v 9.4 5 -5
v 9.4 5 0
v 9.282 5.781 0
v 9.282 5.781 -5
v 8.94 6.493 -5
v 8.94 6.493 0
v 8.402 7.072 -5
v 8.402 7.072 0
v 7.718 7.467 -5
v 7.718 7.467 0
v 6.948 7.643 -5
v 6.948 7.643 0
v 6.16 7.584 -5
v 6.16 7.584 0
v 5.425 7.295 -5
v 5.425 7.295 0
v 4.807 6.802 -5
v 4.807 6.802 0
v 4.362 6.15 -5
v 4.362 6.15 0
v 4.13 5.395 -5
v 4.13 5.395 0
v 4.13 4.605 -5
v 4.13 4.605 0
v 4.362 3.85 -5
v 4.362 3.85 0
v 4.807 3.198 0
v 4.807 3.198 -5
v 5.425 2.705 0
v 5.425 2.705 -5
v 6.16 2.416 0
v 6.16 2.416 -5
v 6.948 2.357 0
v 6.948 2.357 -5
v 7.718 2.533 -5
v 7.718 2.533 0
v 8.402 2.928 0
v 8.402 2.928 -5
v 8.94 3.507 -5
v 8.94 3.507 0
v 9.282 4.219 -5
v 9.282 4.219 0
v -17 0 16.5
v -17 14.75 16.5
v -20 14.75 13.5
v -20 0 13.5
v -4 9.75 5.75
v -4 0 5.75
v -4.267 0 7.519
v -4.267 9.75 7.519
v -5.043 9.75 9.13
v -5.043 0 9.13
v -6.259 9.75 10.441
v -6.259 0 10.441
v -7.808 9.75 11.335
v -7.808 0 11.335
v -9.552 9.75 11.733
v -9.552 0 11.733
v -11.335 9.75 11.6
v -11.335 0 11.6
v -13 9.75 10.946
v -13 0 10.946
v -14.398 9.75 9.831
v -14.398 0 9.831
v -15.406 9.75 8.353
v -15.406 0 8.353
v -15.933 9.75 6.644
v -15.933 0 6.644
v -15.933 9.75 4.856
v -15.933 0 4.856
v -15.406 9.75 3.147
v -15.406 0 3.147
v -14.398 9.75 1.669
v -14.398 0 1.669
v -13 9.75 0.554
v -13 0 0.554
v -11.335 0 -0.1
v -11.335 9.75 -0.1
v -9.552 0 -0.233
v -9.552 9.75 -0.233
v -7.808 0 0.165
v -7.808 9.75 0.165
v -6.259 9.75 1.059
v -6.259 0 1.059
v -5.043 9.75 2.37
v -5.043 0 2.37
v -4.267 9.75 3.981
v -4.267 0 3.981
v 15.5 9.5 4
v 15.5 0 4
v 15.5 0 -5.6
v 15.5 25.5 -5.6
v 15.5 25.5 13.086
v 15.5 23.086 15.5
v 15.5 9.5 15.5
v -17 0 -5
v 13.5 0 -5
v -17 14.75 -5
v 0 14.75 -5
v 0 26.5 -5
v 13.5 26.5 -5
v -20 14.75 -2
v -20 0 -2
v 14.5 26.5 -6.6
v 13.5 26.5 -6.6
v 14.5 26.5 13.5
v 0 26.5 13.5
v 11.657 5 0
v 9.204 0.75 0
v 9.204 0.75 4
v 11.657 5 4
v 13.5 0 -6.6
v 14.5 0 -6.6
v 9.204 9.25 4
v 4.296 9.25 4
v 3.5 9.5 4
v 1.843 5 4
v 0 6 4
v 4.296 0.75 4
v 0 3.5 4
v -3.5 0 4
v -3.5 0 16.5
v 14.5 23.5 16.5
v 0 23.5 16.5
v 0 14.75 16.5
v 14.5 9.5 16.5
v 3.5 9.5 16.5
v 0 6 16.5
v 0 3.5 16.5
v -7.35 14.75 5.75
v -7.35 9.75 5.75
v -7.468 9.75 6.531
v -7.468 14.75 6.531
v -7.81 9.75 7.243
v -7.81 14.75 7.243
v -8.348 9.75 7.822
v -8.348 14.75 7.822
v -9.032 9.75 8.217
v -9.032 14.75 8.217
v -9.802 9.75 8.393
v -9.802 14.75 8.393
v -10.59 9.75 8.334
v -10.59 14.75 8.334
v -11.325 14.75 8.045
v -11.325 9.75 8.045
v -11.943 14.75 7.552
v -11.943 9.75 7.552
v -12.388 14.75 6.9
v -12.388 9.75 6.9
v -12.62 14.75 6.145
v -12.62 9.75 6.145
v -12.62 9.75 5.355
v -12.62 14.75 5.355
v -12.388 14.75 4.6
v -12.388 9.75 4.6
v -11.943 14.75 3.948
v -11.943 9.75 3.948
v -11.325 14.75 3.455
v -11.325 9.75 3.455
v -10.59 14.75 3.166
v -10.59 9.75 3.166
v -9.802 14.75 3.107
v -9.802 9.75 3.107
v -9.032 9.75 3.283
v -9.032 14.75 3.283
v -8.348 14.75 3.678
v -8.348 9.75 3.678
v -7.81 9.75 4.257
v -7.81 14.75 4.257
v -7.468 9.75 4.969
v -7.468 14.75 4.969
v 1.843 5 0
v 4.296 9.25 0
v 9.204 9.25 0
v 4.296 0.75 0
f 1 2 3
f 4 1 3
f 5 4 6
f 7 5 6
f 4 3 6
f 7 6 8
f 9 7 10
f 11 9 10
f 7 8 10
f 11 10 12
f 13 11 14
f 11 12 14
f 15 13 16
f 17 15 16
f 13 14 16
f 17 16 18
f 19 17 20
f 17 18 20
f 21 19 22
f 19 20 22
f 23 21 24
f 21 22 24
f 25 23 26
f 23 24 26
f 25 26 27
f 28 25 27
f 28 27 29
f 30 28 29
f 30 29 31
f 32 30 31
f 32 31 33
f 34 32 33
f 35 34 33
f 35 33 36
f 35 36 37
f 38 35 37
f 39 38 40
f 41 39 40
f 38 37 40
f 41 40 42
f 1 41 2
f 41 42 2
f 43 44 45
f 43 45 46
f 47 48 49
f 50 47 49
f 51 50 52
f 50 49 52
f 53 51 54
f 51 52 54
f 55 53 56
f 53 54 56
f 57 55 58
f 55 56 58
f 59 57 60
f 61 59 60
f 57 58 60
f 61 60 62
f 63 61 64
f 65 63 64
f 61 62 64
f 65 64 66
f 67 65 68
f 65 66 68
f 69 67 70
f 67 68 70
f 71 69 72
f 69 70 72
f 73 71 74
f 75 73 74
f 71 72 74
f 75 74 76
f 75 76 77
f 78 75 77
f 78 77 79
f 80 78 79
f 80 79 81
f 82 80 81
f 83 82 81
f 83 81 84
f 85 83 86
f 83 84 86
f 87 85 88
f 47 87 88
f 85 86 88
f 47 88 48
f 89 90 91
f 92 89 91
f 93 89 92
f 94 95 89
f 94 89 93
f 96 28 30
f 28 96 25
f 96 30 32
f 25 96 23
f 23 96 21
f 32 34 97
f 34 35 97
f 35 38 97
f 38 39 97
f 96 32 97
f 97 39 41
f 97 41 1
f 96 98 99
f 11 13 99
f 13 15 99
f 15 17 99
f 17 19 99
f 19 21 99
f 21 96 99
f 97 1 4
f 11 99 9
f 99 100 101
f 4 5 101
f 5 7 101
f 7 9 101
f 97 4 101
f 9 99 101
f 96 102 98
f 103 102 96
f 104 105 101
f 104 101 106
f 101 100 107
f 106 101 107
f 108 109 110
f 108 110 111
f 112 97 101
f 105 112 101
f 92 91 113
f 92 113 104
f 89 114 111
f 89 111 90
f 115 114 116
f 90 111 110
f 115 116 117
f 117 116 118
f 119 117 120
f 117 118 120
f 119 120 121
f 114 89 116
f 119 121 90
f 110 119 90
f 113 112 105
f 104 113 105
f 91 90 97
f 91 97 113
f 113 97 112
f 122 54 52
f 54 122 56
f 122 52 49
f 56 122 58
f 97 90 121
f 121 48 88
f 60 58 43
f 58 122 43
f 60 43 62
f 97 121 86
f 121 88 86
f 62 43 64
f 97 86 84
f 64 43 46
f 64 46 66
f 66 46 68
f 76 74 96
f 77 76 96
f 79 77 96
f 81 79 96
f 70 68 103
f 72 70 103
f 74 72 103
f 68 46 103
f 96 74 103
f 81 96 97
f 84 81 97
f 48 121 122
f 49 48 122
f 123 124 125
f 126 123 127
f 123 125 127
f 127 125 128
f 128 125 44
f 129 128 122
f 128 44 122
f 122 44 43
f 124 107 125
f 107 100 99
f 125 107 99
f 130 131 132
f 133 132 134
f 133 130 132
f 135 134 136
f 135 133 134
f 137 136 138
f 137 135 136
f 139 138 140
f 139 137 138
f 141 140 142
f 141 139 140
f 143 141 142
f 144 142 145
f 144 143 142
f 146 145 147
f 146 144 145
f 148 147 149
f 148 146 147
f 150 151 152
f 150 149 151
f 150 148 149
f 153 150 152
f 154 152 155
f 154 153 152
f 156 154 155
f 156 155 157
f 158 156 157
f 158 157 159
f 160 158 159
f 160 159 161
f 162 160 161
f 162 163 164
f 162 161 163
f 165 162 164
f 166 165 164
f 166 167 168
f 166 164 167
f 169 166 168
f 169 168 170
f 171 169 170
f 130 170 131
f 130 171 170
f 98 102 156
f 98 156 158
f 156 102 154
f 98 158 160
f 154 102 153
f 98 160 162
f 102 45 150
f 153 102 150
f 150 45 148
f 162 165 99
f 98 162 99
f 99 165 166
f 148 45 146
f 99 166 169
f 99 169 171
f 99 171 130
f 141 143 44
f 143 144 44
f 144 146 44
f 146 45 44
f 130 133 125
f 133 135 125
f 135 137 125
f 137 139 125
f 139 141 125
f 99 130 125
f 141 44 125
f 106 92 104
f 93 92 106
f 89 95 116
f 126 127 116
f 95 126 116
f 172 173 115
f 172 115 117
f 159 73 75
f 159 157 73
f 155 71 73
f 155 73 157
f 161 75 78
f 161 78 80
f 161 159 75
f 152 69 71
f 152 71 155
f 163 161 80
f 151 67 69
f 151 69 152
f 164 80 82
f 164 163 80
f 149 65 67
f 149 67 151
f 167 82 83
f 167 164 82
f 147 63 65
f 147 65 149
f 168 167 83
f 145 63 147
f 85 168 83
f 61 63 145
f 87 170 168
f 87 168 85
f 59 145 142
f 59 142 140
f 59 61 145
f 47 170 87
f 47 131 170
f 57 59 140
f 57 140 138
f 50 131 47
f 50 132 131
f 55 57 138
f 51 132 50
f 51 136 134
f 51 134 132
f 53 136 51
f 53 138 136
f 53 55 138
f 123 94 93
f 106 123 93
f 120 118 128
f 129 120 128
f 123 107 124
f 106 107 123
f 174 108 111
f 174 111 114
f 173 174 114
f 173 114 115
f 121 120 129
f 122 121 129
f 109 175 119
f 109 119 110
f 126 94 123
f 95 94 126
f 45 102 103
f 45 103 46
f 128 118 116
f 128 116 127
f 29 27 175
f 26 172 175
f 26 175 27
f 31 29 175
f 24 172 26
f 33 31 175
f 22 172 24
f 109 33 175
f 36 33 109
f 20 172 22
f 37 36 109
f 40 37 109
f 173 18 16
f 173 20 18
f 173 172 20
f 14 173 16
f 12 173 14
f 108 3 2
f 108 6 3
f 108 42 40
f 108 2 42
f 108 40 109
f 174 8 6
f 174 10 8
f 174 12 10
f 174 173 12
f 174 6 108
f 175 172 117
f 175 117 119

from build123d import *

# Parameters (mm, degrees)
SKETCH_W        = 13.5
SKETCH_H        = 26.5
SKETCH_R        = 2.65
PAD_DEPTH       = 5
PAD001_DEPTH    = 4
SKETCH002_W     = 13.5
SKETCH002_H     = 17
PAD002_DEPTH    = 16.5
SKETCH003_W     = 20
SKETCH003_H     = 21.5
SKETCH003_R     = 2.65
PAD003_DEPTH    = 14.75
SKETCH004_R     = 6
POCKET_DEPTH    = 9.75
PAD004_DEPTH    = 2
CHAMFER_SIZE    = 3
CHAMFER001_SIZE = 3.5
CHAMFER002_SIZE = 1


with BuildPart() as part:
    # Sketch → Pad (new body)
    with BuildSketch(Plane.XY):
        with Locations((6.75, 13.25)):
            Rectangle(SKETCH_W, SKETCH_H)
        with Locations((6.75, 5)):
            Circle(SKETCH_R, mode=Mode.SUBTRACT)
    extrude(amount=-PAD_DEPTH)

    # Sketch001 → Pad001 (join)
    with BuildSketch(Plane.XY):
        Polygon((0, 0), (4.729274, 0), (8.770726, 0), (13.5, 0), (13.5, 26.5), (0, 26.5), align=None)
        Polygon((9.203739, 0.75), (11.657477, 5), (9.203739, 9.25), (4.296261, 9.25), (1.842523, 5), (4.296261, 0.75), align=None, mode=Mode.SUBTRACT)
    extrude(amount=PAD001_DEPTH)

    # Sketch002 → Pad002 (join)
    with BuildSketch(Plane.XY):
        with Locations((6.75, 18)):
            Rectangle(SKETCH002_W, SKETCH002_H)
    extrude(amount=PAD002_DEPTH)

    # Sketch003 (on DatumPlane) → Pad003 (join)
    with BuildSketch(Plane.XZ.offset(-14.75)):
        with Locations((-10, 5.75)):
            Rectangle(SKETCH003_W, SKETCH003_H)
        with Locations((-10, 5.75)):
            Circle(SKETCH003_R, mode=Mode.SUBTRACT)
    extrude(amount=PAD003_DEPTH)

    # Sketch004 → Pocket (cut)
    with BuildSketch(Plane.XZ):
        with Locations((-10, 5.75)):
            Circle(SKETCH004_R)
    extrude(amount=-POCKET_DEPTH, mode=Mode.SUBTRACT)

    # Sketch005 (on DatumPlane) → Pad004 (join)
    with BuildSketch(Plane.YZ.offset(13.5)):
        Polygon((0, 0), (0, -6.6), (26.5, -6.6), (26.5, 16.5), (9.5, 16.5), (9.5, 4), (0, 4), align=None)
    extrude(amount=PAD004_DEPTH)

    # Chamfer
    chamfer_edges = [part.edges().sort_by_distance(p)[0] for p in [
        (6.75, 26.5, 16.5),
        (14.5, 26.5, 16.5),
        (-20, 7.375, -5),
        (-20, 7.375, 16.5),
    ]]
    chamfer(chamfer_edges, length=CHAMFER_SIZE)

    # Chamfer001
    chamfer001_edges = [part.edges().sort_by_distance(p)[0] for p in [
        (0, 9.5, 10.25),
        (0, 0, 10.25),
    ]]
    chamfer(chamfer001_edges, length=CHAMFER001_SIZE)

    # Chamfer002
    chamfer002_edges = [part.edges().sort_by_distance(p)[0] for p in [
        (15.5, 16.5, 16.5),
        (15.5, 13.25, -6.6),
        (15.5, 25, 15),
        (15.5, 26.5, 3.45),
    ]]
    chamfer(chamfer002_edges, length=CHAMFER002_SIZE)


solid = part.part
